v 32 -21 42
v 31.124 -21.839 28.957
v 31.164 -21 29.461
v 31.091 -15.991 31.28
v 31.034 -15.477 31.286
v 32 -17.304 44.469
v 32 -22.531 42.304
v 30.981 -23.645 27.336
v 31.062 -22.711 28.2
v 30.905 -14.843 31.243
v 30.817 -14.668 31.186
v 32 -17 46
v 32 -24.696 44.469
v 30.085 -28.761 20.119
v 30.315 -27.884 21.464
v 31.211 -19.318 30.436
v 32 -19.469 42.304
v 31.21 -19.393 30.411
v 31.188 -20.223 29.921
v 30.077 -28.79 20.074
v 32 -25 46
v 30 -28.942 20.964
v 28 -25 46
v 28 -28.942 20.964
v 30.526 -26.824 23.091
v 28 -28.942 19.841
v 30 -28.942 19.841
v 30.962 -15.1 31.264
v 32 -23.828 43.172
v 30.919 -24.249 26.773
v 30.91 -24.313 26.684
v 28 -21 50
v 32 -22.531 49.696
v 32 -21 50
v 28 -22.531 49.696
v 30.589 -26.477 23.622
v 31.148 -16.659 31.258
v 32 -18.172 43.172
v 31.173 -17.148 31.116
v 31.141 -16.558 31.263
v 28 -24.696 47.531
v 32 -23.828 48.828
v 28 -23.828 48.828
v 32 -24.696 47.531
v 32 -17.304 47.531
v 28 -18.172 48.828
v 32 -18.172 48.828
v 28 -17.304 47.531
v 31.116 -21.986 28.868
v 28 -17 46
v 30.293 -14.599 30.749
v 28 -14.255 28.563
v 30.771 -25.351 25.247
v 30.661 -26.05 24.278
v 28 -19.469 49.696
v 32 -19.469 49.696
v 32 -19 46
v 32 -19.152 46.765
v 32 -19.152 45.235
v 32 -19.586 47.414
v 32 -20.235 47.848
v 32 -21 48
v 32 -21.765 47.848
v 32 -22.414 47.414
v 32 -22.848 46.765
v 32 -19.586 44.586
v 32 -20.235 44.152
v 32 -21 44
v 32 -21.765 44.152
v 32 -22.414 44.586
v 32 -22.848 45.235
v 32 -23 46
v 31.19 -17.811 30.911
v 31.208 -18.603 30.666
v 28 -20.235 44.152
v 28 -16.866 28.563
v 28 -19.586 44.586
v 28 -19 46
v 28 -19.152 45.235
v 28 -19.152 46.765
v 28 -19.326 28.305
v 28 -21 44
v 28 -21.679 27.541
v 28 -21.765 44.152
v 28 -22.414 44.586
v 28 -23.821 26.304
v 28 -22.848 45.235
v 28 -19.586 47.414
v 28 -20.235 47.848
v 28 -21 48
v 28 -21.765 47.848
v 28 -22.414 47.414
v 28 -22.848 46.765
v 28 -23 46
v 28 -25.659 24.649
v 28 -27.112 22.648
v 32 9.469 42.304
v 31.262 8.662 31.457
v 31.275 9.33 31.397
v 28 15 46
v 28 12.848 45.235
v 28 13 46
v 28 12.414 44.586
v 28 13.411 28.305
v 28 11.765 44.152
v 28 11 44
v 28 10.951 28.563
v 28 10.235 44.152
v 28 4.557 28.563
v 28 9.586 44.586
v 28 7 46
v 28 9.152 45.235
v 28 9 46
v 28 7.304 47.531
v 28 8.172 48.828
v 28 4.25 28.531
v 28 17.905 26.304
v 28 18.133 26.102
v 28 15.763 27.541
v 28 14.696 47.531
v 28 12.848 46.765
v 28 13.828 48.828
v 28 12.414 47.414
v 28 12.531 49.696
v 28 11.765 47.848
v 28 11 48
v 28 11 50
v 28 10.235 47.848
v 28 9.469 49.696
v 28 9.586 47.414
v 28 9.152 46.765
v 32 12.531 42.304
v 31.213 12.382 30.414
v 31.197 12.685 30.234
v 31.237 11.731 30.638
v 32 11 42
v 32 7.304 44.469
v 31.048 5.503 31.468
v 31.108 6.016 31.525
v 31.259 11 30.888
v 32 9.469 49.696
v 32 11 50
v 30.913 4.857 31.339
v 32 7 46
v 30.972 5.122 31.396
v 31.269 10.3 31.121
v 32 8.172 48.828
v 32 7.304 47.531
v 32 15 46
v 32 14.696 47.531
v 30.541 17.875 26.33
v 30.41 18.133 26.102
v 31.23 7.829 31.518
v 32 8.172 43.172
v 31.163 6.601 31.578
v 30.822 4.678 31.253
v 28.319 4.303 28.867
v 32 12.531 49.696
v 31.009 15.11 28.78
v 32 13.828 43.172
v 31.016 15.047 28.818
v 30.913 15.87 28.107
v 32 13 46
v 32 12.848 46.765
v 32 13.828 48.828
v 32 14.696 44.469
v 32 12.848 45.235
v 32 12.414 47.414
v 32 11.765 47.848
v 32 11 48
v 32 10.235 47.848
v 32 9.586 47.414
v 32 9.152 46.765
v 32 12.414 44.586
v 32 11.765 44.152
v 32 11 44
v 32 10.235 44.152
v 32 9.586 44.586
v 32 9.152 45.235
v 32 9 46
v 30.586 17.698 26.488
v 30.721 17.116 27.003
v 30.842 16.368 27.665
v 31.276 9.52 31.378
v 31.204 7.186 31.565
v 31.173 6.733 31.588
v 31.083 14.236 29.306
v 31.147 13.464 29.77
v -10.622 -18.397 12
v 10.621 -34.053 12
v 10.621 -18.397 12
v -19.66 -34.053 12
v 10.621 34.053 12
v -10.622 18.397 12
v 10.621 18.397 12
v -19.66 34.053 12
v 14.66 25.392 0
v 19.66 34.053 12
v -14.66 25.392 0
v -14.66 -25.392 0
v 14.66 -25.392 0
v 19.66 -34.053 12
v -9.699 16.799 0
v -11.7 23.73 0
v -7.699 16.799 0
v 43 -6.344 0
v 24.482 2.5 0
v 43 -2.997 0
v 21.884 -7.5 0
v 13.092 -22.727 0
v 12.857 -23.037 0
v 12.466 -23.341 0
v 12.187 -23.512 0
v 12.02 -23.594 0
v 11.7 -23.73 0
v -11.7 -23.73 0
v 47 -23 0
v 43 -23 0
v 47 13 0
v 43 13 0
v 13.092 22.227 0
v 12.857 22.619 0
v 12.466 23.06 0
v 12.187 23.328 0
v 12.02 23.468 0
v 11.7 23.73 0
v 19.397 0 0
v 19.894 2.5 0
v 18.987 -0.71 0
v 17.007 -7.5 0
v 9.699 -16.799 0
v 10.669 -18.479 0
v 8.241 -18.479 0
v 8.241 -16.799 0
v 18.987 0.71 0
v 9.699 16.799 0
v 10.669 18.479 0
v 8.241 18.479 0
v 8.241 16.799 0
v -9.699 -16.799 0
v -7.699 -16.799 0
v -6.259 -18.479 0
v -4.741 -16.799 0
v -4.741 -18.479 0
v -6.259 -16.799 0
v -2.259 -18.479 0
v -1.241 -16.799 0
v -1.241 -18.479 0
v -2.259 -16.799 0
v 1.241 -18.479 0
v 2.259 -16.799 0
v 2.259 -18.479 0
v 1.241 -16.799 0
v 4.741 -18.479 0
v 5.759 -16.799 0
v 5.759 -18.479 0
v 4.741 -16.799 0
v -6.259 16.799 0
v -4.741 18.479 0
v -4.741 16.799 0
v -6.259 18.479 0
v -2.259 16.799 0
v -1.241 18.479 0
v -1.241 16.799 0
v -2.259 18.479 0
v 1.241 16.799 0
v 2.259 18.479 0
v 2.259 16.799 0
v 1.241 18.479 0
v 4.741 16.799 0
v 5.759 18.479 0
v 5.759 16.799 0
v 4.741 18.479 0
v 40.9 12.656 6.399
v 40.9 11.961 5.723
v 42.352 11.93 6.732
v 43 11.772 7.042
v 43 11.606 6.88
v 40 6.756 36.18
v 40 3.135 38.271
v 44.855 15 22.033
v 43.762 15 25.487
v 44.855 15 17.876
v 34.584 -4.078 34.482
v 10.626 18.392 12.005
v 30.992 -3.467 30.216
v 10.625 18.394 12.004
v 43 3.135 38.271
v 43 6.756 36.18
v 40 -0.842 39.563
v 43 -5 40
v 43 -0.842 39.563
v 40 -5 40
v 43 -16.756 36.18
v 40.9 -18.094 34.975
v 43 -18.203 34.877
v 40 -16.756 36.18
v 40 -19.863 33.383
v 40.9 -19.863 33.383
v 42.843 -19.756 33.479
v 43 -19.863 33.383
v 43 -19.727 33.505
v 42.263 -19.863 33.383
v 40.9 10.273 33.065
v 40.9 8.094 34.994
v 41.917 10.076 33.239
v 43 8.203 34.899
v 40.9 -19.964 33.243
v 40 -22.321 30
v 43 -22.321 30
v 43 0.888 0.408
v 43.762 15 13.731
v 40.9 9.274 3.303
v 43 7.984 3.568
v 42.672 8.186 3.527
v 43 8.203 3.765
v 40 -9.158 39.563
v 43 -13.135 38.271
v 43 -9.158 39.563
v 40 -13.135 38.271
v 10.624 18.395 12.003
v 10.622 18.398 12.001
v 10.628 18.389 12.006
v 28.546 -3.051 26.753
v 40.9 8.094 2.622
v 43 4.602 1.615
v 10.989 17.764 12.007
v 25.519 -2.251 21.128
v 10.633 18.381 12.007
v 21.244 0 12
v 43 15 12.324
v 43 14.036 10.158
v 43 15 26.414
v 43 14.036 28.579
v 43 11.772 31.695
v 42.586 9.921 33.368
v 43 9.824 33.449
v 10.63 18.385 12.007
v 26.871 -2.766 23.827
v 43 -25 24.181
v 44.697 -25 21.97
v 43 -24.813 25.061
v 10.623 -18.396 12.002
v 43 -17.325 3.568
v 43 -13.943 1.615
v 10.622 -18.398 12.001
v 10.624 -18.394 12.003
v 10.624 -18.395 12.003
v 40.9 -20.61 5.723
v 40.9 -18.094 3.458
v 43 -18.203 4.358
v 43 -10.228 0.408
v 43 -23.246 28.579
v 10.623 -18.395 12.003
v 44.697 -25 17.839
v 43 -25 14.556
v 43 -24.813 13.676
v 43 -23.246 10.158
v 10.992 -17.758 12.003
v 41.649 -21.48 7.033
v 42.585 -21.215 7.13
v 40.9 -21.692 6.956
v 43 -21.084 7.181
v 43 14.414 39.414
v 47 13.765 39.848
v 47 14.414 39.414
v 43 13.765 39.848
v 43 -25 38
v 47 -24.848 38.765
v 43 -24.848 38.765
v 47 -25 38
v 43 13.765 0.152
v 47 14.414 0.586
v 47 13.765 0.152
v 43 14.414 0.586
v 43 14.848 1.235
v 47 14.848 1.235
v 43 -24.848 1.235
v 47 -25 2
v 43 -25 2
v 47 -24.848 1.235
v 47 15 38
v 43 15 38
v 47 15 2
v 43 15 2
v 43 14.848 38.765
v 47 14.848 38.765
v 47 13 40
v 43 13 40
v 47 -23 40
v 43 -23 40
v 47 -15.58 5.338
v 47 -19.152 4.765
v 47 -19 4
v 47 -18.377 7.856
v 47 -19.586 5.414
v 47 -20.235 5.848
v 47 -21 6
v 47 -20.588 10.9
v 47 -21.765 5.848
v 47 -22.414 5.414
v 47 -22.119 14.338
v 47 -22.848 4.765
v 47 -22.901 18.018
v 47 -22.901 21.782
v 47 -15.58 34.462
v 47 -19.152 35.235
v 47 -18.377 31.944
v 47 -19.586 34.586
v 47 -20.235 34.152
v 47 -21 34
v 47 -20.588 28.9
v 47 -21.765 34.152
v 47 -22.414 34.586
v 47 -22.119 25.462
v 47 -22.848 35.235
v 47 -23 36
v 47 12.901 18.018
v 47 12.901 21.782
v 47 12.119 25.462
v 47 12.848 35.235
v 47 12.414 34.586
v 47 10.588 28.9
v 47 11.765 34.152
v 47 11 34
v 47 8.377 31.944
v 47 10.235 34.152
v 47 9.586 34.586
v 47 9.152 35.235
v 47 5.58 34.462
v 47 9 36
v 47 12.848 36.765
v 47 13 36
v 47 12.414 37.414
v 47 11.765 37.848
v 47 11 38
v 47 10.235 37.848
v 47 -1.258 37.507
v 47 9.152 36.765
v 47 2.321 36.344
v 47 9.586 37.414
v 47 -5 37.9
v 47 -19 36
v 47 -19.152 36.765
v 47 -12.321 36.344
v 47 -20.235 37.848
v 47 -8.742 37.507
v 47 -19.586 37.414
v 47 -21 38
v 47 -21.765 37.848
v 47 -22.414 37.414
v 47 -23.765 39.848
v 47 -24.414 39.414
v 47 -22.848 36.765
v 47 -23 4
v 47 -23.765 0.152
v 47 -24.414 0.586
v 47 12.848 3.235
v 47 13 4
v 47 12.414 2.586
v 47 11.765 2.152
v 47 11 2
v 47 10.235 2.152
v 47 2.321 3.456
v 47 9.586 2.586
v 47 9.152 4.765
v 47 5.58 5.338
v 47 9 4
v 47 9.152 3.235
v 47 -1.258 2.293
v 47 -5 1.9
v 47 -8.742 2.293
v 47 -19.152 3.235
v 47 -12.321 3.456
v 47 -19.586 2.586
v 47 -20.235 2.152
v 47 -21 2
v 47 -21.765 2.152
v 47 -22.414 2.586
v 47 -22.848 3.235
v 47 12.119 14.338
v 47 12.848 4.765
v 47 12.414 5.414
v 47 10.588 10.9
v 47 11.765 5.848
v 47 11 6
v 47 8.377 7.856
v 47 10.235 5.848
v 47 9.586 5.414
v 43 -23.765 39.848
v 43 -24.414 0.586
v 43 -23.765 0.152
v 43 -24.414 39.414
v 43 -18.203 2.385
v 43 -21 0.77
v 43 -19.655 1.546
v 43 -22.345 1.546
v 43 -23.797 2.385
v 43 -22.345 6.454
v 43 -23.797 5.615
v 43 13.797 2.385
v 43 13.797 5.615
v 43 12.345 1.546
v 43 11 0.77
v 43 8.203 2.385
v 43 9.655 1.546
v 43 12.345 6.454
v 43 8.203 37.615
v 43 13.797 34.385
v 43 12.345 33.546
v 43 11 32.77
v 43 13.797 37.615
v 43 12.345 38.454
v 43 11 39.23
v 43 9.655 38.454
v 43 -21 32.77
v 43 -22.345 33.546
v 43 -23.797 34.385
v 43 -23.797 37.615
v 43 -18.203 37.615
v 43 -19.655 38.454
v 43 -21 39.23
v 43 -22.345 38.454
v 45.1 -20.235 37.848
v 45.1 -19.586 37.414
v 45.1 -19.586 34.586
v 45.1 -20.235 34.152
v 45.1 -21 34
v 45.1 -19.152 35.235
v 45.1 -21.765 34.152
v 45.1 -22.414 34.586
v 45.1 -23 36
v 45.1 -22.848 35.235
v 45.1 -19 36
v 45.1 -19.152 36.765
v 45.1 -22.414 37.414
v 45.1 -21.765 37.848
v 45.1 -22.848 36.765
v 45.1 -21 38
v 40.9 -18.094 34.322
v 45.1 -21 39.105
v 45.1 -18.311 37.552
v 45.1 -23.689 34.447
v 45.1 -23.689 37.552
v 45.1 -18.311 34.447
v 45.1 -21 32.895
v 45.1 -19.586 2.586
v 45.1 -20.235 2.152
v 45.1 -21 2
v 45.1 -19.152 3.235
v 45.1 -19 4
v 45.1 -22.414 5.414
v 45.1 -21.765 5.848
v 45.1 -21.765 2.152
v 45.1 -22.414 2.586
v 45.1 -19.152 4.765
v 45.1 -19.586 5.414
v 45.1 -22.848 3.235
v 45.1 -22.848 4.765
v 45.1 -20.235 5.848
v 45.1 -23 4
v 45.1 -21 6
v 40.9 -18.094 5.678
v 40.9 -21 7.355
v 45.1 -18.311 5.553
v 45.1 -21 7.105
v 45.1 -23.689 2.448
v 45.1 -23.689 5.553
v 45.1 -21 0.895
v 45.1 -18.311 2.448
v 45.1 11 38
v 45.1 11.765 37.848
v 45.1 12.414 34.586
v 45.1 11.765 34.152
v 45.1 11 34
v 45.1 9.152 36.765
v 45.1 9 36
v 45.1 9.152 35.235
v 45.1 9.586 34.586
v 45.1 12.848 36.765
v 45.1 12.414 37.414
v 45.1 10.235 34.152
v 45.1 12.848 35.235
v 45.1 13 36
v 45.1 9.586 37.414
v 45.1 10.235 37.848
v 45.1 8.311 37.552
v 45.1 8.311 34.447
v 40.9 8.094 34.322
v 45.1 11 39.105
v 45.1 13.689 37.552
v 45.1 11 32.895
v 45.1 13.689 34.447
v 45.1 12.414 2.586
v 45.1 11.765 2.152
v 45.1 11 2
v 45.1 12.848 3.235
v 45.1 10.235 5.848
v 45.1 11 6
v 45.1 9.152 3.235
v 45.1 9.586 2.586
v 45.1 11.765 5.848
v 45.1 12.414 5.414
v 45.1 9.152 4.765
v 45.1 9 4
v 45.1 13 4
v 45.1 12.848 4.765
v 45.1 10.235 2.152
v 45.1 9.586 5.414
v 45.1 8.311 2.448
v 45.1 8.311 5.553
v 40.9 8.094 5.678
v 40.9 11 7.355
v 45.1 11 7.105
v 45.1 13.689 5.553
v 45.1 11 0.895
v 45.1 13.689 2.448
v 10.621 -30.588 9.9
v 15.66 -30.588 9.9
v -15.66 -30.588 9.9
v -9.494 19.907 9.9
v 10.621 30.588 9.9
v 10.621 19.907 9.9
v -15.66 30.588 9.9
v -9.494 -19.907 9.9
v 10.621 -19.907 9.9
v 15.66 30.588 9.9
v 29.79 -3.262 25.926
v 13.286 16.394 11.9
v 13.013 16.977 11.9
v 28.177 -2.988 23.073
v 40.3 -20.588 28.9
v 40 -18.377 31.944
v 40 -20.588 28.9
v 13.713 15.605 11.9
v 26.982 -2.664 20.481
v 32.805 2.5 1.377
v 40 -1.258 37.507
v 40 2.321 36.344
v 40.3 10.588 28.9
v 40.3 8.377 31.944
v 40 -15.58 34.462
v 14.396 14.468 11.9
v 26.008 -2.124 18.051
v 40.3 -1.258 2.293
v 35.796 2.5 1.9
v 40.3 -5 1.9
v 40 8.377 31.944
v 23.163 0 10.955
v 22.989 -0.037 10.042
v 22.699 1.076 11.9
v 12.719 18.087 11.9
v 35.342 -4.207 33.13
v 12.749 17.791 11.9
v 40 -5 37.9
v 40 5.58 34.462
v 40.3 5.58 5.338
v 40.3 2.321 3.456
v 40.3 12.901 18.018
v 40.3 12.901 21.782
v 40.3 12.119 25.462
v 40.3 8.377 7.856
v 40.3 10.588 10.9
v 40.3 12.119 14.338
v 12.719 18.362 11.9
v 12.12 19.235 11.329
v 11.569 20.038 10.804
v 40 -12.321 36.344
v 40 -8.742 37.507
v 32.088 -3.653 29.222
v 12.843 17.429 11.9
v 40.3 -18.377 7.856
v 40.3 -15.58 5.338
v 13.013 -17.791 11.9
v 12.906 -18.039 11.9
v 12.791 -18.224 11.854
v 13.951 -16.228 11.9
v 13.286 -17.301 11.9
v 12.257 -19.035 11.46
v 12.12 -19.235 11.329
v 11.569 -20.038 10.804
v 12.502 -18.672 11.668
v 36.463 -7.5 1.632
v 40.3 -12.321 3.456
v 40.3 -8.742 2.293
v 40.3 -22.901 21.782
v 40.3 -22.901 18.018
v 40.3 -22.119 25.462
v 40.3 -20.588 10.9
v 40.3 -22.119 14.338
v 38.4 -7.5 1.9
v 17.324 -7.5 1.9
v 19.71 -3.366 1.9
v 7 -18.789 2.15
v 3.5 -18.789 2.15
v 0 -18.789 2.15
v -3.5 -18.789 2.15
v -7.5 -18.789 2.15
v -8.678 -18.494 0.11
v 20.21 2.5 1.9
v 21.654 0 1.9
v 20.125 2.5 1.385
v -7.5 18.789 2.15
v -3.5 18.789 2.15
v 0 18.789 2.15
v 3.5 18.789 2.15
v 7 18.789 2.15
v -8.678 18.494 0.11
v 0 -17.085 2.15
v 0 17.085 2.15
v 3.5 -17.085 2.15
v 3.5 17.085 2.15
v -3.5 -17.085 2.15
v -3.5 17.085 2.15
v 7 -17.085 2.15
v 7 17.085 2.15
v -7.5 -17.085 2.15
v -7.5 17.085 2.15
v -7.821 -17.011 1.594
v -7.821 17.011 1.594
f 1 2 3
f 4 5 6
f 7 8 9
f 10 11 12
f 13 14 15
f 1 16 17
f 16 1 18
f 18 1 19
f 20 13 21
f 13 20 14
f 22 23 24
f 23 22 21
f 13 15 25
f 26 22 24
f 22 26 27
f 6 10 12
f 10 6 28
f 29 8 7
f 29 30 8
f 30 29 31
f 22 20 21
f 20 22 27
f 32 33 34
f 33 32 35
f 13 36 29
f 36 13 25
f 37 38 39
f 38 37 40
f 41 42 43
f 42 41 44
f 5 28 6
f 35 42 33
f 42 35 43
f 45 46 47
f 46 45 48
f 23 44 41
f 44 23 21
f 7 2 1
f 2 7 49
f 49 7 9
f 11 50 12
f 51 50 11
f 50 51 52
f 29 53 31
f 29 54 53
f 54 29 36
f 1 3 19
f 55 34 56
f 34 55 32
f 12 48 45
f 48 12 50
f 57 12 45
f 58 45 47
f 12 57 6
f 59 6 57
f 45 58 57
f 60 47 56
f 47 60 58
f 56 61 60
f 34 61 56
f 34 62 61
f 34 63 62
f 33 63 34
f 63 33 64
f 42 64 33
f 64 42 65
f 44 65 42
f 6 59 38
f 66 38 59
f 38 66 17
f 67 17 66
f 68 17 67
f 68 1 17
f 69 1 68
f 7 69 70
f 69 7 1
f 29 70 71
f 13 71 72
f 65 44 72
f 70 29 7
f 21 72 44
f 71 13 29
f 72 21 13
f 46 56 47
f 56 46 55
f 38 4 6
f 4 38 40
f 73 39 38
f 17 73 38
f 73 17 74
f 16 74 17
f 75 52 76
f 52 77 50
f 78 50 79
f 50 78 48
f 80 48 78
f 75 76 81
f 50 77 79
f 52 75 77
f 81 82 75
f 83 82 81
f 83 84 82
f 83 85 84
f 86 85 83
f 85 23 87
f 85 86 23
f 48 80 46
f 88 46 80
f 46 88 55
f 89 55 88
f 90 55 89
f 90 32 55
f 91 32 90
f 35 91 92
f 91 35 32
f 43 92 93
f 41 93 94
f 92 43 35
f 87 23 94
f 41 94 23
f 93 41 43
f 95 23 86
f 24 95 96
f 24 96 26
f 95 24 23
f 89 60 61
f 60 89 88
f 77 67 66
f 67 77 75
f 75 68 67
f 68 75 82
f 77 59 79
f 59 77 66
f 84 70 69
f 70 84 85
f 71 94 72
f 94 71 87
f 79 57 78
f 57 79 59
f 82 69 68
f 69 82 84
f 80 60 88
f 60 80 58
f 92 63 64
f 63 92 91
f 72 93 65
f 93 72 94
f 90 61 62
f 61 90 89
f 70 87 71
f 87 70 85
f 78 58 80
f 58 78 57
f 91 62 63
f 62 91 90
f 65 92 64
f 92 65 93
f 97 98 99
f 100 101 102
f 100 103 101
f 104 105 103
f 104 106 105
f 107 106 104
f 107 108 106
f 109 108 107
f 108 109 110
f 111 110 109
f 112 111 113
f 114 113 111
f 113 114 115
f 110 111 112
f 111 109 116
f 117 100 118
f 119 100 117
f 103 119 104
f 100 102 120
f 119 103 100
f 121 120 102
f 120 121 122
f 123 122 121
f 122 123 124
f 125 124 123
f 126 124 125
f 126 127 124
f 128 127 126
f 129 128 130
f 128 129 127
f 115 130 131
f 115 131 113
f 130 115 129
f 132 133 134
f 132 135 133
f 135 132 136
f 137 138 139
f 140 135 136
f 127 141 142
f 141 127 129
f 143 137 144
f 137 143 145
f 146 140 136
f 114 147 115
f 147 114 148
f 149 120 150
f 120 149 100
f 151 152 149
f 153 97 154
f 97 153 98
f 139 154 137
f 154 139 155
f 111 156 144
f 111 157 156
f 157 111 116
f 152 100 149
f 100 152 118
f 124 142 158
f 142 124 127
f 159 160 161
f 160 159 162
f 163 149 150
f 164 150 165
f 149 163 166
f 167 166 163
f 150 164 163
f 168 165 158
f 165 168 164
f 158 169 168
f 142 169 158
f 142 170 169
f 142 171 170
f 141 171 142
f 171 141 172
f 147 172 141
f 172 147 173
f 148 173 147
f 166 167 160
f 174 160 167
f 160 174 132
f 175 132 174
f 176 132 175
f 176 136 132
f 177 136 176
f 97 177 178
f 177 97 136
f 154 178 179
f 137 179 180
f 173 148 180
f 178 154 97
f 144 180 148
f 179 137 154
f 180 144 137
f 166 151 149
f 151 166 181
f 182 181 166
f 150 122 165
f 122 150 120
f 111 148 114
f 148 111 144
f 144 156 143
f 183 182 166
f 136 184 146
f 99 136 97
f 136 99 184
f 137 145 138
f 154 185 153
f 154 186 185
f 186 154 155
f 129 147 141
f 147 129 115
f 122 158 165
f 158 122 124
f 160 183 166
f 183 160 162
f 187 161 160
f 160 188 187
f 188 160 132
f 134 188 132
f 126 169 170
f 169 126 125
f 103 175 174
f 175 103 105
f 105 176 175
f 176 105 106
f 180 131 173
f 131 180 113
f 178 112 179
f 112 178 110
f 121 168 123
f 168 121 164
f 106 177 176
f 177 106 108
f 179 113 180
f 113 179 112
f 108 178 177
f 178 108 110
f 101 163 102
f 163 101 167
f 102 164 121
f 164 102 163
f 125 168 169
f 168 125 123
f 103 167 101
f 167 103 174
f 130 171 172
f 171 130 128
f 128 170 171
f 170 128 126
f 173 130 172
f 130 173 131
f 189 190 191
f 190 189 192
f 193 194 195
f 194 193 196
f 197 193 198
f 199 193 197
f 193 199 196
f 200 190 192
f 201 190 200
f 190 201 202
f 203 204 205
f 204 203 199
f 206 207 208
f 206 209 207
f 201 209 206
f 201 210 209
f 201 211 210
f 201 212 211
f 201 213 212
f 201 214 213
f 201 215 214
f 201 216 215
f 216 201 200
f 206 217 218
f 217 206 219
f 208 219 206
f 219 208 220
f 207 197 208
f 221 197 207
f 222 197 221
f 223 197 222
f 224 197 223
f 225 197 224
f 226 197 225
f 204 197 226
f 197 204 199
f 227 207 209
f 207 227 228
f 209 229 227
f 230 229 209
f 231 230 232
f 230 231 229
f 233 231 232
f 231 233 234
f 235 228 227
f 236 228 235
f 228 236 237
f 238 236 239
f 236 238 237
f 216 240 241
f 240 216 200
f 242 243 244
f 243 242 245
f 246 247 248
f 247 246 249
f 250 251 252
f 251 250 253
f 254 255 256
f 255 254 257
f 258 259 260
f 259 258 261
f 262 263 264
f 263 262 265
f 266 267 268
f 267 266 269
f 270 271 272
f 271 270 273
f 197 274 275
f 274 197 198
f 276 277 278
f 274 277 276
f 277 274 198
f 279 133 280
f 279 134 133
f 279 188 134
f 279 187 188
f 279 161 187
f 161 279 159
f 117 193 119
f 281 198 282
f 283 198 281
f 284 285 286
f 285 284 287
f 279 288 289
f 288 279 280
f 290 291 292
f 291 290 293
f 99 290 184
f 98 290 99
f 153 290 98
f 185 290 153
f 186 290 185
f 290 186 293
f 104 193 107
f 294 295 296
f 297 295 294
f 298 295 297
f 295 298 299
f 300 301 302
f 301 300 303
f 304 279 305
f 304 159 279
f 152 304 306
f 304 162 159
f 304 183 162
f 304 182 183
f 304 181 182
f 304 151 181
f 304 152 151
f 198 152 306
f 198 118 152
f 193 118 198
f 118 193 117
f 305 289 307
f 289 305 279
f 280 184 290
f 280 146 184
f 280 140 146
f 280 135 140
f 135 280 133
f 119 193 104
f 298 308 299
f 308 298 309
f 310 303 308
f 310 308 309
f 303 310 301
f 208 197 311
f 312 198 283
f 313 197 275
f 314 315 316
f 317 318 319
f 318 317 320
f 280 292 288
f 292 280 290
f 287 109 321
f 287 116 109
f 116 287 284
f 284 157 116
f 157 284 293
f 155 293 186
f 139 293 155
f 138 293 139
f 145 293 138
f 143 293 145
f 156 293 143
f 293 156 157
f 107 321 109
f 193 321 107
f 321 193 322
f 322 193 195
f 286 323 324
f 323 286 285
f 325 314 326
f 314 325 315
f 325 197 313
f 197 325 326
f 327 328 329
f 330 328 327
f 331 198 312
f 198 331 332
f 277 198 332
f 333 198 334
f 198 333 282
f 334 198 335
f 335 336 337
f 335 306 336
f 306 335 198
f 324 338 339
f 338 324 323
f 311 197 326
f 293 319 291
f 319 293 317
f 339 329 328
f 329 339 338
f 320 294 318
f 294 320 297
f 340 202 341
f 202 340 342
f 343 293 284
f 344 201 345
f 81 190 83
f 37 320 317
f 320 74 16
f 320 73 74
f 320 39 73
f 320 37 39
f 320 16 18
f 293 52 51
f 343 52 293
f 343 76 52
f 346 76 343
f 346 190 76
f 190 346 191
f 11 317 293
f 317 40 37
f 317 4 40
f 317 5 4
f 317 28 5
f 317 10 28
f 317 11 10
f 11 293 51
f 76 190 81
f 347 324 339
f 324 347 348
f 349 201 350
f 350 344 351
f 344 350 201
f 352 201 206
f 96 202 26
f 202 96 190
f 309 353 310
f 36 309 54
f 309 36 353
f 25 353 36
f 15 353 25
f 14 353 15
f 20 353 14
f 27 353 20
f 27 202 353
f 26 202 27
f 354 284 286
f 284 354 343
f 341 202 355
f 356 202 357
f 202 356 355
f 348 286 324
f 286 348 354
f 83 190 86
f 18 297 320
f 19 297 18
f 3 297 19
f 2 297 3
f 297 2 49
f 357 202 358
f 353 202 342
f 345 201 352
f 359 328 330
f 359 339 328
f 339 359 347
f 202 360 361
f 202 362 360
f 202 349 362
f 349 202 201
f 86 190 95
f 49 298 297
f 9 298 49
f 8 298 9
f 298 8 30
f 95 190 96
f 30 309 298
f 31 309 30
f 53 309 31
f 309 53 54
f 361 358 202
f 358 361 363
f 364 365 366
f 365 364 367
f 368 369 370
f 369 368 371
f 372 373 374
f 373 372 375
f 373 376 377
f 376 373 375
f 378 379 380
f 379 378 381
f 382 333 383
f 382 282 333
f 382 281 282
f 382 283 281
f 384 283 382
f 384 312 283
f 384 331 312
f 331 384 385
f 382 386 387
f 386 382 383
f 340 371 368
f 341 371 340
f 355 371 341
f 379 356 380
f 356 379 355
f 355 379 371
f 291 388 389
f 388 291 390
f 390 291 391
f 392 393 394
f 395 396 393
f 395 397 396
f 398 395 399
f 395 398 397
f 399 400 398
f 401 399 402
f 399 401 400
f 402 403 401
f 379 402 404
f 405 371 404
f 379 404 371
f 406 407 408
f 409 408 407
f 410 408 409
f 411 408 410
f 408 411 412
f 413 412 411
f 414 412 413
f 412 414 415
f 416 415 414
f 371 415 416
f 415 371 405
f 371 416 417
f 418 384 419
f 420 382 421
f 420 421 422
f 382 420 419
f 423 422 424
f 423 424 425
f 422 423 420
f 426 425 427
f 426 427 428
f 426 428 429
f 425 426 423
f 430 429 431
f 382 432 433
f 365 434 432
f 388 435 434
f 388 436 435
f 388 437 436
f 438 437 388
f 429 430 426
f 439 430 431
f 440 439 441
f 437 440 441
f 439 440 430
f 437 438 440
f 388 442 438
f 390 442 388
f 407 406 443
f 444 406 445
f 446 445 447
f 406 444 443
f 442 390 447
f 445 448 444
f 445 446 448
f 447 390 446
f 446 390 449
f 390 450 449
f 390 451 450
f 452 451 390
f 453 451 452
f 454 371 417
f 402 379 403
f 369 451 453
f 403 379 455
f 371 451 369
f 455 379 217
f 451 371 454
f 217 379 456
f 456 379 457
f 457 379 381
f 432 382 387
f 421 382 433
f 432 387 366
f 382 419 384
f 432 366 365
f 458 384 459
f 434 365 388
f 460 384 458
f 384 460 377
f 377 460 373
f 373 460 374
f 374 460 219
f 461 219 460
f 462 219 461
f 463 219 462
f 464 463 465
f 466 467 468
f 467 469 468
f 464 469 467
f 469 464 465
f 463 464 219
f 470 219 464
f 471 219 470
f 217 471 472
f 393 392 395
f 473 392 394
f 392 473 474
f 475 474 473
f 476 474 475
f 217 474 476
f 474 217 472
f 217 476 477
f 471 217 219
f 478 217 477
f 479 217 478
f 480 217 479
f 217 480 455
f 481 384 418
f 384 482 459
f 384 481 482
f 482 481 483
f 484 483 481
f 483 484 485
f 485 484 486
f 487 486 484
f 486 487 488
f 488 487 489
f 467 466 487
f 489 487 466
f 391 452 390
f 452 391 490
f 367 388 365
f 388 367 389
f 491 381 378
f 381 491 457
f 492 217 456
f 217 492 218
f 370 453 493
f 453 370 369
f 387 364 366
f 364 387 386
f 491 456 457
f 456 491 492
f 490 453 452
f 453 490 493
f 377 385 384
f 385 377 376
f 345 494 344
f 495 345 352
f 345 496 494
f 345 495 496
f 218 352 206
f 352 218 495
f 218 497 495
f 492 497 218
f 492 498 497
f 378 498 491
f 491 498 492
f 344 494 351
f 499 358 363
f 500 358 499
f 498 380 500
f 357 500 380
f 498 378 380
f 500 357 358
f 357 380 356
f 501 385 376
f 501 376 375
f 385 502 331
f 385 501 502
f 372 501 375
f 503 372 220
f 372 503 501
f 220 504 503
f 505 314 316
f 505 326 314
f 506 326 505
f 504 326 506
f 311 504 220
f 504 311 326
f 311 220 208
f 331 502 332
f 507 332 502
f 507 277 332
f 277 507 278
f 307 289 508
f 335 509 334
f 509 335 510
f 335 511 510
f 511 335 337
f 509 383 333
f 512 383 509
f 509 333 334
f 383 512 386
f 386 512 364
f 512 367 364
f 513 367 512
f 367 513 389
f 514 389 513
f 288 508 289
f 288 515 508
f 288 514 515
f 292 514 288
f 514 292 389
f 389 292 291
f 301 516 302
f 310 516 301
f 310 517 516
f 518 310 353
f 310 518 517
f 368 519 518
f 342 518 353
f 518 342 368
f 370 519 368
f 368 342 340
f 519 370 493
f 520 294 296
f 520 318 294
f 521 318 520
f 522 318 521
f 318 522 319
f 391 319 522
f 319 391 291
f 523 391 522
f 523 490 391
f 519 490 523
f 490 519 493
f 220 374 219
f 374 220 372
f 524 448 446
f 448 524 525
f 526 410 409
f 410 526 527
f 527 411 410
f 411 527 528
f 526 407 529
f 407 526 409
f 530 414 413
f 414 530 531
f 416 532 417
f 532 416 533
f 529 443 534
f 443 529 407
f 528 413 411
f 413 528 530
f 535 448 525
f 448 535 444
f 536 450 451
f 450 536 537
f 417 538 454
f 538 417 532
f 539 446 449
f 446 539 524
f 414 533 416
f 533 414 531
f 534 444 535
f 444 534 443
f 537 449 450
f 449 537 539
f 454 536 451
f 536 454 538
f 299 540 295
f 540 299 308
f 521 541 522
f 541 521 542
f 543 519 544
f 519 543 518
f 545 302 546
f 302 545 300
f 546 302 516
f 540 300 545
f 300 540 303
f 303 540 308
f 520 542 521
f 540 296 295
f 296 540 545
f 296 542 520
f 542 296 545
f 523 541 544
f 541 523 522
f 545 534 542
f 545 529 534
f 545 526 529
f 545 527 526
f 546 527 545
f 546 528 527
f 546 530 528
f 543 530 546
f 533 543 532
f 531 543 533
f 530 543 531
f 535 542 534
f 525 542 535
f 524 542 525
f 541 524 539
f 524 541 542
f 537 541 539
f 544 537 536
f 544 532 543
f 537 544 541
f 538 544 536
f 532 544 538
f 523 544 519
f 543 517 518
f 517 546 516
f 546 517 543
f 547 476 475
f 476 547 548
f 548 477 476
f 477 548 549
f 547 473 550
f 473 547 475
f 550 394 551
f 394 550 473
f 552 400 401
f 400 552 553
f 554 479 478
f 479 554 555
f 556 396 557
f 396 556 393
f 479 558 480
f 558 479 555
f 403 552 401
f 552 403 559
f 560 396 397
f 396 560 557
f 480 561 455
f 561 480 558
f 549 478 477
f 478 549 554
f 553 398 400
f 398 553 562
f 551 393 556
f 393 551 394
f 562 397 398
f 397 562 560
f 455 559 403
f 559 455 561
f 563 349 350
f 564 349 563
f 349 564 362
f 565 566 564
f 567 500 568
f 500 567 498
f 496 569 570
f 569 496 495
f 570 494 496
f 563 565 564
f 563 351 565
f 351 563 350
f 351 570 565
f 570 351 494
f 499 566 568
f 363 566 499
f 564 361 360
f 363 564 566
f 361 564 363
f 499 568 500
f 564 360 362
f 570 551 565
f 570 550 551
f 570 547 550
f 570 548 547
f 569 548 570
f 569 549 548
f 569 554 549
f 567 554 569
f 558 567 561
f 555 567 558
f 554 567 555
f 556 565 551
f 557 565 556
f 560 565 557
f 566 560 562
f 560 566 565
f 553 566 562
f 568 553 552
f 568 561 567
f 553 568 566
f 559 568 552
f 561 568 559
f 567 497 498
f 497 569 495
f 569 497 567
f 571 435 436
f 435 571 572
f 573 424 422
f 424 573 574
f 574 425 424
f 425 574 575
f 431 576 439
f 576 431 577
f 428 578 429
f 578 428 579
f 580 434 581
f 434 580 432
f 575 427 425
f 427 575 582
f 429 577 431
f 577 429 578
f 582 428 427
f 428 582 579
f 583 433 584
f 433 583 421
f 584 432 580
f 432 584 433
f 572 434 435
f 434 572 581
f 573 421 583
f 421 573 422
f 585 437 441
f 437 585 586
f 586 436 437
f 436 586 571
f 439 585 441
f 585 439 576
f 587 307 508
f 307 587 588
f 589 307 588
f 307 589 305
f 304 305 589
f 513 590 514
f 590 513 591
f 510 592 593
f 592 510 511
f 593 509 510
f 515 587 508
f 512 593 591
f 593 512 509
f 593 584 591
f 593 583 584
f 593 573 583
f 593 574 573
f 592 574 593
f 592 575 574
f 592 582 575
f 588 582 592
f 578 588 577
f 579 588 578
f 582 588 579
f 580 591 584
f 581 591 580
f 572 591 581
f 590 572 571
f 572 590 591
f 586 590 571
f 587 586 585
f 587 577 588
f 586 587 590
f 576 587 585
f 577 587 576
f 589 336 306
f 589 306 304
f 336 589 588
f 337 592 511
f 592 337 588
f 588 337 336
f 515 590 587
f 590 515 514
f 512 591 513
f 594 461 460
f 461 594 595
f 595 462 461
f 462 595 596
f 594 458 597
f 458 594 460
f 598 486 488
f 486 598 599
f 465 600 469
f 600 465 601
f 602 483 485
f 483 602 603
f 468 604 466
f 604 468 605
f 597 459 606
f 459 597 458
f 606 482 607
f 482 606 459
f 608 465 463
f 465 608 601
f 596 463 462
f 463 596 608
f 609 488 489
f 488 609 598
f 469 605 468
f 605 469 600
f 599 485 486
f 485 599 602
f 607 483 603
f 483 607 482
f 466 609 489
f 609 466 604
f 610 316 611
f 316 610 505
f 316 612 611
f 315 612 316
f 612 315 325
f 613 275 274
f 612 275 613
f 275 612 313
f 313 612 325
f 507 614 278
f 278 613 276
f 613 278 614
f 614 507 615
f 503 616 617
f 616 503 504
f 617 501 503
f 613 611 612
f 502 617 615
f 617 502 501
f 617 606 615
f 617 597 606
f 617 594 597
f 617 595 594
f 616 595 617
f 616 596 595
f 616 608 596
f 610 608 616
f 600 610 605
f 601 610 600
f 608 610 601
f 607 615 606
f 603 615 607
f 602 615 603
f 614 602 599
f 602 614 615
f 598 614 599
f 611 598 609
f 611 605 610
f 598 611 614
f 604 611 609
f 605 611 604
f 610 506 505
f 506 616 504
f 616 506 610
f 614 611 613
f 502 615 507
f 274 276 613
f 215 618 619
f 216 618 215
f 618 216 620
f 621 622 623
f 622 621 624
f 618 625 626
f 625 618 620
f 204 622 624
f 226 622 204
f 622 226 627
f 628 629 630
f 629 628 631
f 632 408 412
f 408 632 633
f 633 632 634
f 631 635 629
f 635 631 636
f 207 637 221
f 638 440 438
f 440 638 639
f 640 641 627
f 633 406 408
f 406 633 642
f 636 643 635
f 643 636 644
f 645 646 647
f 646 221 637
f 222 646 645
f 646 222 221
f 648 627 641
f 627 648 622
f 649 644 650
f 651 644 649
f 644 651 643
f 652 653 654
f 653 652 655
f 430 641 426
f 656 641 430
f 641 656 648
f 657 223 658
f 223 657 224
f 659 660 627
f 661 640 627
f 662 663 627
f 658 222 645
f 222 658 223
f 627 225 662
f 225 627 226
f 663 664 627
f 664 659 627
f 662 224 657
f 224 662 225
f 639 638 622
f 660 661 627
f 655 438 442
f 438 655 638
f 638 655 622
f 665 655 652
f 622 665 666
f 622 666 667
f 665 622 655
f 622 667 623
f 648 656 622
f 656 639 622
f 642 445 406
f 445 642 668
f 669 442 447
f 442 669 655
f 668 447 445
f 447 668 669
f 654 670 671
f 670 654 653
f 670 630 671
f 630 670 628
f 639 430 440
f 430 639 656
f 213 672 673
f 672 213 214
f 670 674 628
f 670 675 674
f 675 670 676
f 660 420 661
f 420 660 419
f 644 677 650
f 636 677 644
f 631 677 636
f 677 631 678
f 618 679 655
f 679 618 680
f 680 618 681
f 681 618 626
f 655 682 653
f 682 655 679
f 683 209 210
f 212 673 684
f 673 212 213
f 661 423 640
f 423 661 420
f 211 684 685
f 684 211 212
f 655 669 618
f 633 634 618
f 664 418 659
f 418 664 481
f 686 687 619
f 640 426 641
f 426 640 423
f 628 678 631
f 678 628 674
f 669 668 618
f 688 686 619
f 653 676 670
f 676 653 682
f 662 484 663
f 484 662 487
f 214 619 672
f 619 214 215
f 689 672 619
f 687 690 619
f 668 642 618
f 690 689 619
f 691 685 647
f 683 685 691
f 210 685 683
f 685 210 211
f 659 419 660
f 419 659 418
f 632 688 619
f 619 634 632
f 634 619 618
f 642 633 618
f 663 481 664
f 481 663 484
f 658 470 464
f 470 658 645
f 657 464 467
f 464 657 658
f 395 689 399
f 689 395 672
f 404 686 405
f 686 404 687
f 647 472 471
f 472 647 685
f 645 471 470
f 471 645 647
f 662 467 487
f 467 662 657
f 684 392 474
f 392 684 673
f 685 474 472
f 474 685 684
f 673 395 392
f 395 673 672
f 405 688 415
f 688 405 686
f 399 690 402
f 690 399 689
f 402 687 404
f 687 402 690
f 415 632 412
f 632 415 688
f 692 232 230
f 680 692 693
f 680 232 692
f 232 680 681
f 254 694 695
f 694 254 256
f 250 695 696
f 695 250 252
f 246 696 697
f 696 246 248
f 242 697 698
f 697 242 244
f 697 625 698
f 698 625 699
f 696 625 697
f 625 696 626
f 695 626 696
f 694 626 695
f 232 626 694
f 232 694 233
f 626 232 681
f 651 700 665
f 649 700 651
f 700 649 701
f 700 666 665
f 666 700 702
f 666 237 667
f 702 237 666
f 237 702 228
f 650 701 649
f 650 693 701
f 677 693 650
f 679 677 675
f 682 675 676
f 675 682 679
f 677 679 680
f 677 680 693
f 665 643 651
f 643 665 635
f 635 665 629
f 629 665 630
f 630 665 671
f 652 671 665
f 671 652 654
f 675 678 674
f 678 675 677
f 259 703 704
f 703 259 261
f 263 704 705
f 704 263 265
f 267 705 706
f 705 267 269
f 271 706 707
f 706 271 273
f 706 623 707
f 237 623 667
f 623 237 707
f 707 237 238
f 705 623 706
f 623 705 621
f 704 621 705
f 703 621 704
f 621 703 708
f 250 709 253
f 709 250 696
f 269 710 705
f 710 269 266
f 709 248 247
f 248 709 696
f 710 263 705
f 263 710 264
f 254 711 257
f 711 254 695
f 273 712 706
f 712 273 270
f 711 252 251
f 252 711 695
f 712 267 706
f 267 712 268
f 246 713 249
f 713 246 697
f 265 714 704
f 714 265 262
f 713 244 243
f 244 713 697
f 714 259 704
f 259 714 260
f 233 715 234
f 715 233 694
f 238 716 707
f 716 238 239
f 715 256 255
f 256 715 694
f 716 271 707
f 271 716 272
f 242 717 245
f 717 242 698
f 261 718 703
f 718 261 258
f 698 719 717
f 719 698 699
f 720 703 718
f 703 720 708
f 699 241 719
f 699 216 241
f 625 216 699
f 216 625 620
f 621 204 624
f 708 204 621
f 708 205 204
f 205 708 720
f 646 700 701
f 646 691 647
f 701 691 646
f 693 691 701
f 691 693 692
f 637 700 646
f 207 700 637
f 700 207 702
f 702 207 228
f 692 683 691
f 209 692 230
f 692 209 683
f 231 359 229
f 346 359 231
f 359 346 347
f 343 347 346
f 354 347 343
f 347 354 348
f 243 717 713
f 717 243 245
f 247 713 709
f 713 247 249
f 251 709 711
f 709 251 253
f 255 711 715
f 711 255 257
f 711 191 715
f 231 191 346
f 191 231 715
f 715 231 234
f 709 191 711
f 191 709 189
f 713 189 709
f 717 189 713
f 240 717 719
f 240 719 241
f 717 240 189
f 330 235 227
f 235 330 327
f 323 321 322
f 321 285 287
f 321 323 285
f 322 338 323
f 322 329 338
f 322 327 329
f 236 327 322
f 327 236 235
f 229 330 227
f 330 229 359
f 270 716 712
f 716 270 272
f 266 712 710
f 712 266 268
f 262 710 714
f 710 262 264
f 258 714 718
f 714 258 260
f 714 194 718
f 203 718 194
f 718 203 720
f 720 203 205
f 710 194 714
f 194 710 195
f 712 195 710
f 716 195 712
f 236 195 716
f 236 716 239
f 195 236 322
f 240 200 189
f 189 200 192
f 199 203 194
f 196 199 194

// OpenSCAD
hot_rad = 30/2/cos(30);
hotend_x=25;
fan_x = 15+5;

hotend_y=-5;

thickness = 10;
wall=2;
slop=.2;

fan_hole = (40-wall-wall)/2;
mount_drop = 10;
fan_z = fan_hole+wall;

fan_mount();
//bowden_fan();
//cyclops_fan();

%cylinder(r=hot_rad, h=20, center=true);
%translate([-23,0,0]) cylinder(r=hot_rad, h=20, center=true);

m3_cap_rad = 4;
m3_rad = 2;
m3_nut_rad = 6.01/2+.1;

facets = 6;

duct_angle=-5;
duct_jut = -5;

module fan_mount(){
    difference(){
        union(){
            //core
            cylinder(r1=hot_rad+thickness+wall, r2=hot_rad+thickness*2+wall, h=thickness+wall, $fn=facets);
            
            hull(){
                intersection(){
                    difference(){
                        cylinder(r1=hot_rad+thickness+wall, r2=hot_rad+thickness*2+wall, h=thickness+wall, $fn=facets);
                        translate([0,0,-.5]) cylinder(r1=hot_rad+wall, r2=hot_rad+wall+wall, h=thickness+wall+1, $fn=facets);
                    }
                    translate([50+hot_rad-6.7,50,50]) cube([100,100,100], center=true);
                }
                translate([hotend_x+fan_x-5,hotend_y,fan_z]) rotate([0,90,0]) cylinder(r=fan_hole+wall, h=5);
            }
            
            hull(){
                intersection(){
                    difference(){
                        cylinder(r1=hot_rad+thickness+wall, r2=hot_rad+thickness*2+wall, h=thickness+wall, $fn=facets);
                        translate([0,0,-.5]) cylinder(r1=hot_rad+wall, r2=hot_rad+wall+wall, h=thickness+wall+1, $fn=facets);
                    }
                    translate([50+hot_rad-6.7,-50,50]) cube([100,100,100], center=true);
                }
                translate([hotend_x+fan_x-5,hotend_y,fan_z]) rotate([0,90,0]) cylinder(r=fan_hole+wall, h=5);
            }
            
            //fan mount
            translate([hotend_x+fan_x,hotend_y,fan_z]) rotate([0,90,0]){
                hull() for(i=[0:90:359]) rotate([0,0,i]) {
                    #translate([20-wall,20-wall,-wall]) cylinder(r=wall,h=wall*2, $fn=16);
                }    
            }
            
            //mounting lugs above fan
            translate([hotend_x+fan_x,hotend_y,fan_z]) rotate([0,90,0]){
                for(i=[-16, 16]) difference(){
                    hull(){
                        translate([-16-mount_drop,i,-fan_x+3]) cylinder(r=m3_rad+wall, h=wall*2, $fn=16);
                        translate([0,i,-fan_x+3]) cylinder(r=m3_cap_rad*2, h=wall);
                    }
                    translate([-16-mount_drop,i,-fan_x+3-.1]) cylinder(r=m3_rad, h=wall*2+1, $fn=16);
                }
            }
        }
        
        //center cutout
        translate([0,0,-.5]) cylinder(r1=hot_rad+wall, r2=hot_rad+wall+wall, h=thickness+wall+1, $fn=facets);
                
        //front cutout
        translate([-(hot_rad+thickness*2+wall),0,0]) cylinder(r=hot_rad+thickness*2+wall, h=thickness+wall*10, center=true, $fn=facets);
        
        //fan holes
        translate([hotend_x+fan_x,hotend_y,fan_z]) rotate([0,90,0]){
            for(i=[-16, 16]) for(j=[-16, 16]) {
                #translate([j,i,-.1]) cylinder(r=m3_rad, h=wall+.2, $fn=16);
                translate([j,i,-wall*2-.1]) cylinder(r2=m3_nut_rad, r1=m3_nut_rad+.25, h=wall*2+.2, $fn=6);
            }
        }
        
        //air path
        translate([0,0,-.1]) difference(){
            union(){
                translate([-wall,0,0]) cylinder(r1=hot_rad+thickness, r2=hot_rad+thickness*2-wall, h=thickness, $fn=facets);
                hull(){
                    intersection(){
                        difference(){
                            translate([-wall,0,0]) cylinder(r1=hot_rad+thickness, r2=hot_rad+thickness*2-wall, h=thickness, $fn=facets);
                            translate([0,0,-.5]) cylinder(r1=hot_rad+wall*2, r2=hot_rad+wall*3, h=thickness+wall+1, $fn=facets);
                        }
                        translate([50+hot_rad-6.7,50,50]) cube([100,100,100], center=true);
                    }
                    translate([hotend_x+fan_x-5,hotend_y,fan_z]) rotate([0,90,0]) cylinder(r=fan_hole, h=.3);
                }
                
                hull(){
                    intersection(){
                        difference(){
                            translate([-wall,0,0]) cylinder(r1=hot_rad+thickness, r2=hot_rad+thickness*2-wall, h=thickness, $fn=facets);
                            translate([0,0,-.5]) cylinder(r1=hot_rad+wall+wall, r2=hot_rad+wall+wall+wall, h=thickness+wall+1, $fn=facets);
                        }
                        translate([50+hot_rad-6.7,-50,50]) cube([100,100,100], center=true);
                    }
                    translate([hotend_x+fan_x-5,hotend_y,fan_z]) rotate([0,90,0]) cylinder(r=fan_hole, h=.3);
                }
                
                translate([hotend_x+fan_x-5,hotend_y,fan_z]) rotate([0,90,0]) cylinder(r=fan_hole, h=wall+1+5);
            }
            difference () {
                cylinder(r1=hot_rad+wall+wall, r2=hot_rad+wall+wall+wall, h=thickness+wall, $fn=facets);
                #translate([0,(hot_rad*2+wall+wall)/2,.75]) rotate([0,-90,90]) cylinder(r=1.5, h=hot_rad*2+wall+wall, $fn=3);
                #translate([3.5,(hot_rad*2+wall+wall)/2,.75]) rotate([0,-90,90]) cylinder(r=1.5, h=hot_rad*2+wall+wall, $fn=3);
                #translate([-3.5,(hot_rad*2+wall+wall)/2,.75]) rotate([0,-90,90]) cylinder(r=1.5, h=hot_rad*2+wall+wall, $fn=3);
                #translate([7,(hot_rad*2+wall+wall)/2,.75]) rotate([0,-90,90]) cylinder(r=1.5, h=hot_rad*2+wall+wall, $fn=3);
                #translate([-7.5,(hot_rad*2+wall+wall)/2,.75]) rotate([0,-90,90]) cylinder(r=1.5, h=hot_rad*2+wall+wall, $fn=3);
            }
            translate([-(hot_rad+thickness*2),0,0]) cylinder(r=hot_rad+thickness*2+wall, h=thickness+wall*10, center=true, $fn=facets);
            translate([0,-5+hotend_y/2,0])cube([100,10,wall]);
        }
    }
}

module bowden_fan(){
    duct_w = 15+slop;
    duct_h = 20+slop;
    duct_offset=38;
    
    mount_height = 46;
    
    offset = -20;
    difference(){
        union(){
            //core
            hull(){
                cylinder(r1=hot_rad+thickness+wall, r2=hot_rad+thickness*2+wall, h=thickness+wall, $fn=facets);
                translate([offset,0,0]) cylinder(r1=hot_rad+thickness+wall, r2=hot_rad+thickness*2+wall, h=thickness+wall, $fn=facets);
            }
            
            //connection to duct
            hull(){
                intersection(){
                    cylinder(r1=hot_rad+thickness+wall, r2=hot_rad+thickness*2+wall, h=thickness+wall, $fn=facets);
                    translate([hot_rad+wall*2,0,0]) cube([1,200,200], center=true);
                }
                translate([duct_offset,duct_jut,duct_h/2+wall]) rotate([0,0,duct_angle]) cube([1,duct_w+wall*2, duct_h+wall*2], center=true);
            }
            
            //the duct connector
            translate([duct_offset,duct_jut,0]) rotate([0,0,duct_angle]) duct();
            
            //mounting lugs
           for(i=[10,-20,-40]) difference(){
                translate([i,hot_rad+wall*2,0]) hull(){
                    translate([5,0,thickness]) rotate([90,0,0]) cylinder(r=m3_cap_rad+wall*2, h=wall, center=true);
                    translate([0,0,mount_height]) rotate([90,0,0]) cylinder(r=m3_cap_rad+wall, h=wall, center=true);
                }
                
                //mounting holes up top
                translate([i,hot_rad+wall*2,mount_height]) rotate([90,0,0]) cylinder(r=m3_rad+slop, h=20, center=true);
            }
        }
        
        //connection to duct airflow
        hull(){
            intersection(){
                translate([0,0,wall]) cylinder(r1=hot_rad+thickness, r2=hot_rad+thickness*2, h=thickness-wall, $fn=facets);
                translate([hot_rad+wall*3,0,0]) cube([1,200,200], center=true);
            }
            translate([duct_offset,duct_jut,duct_h/2+wall]) rotate([0,0,duct_angle]) cube([1.2,duct_w, duct_h], center=true);
        }
        
        //center cutout
        translate([0,0,-.5]) hull(){
            cylinder(r1=hot_rad+wall, r2=hot_rad+wall*3, h=thickness+wall+1, $fn=facets);
            translate([2*offset,0,0]) cylinder(r1=hot_rad+wall, r2=hot_rad+wall*3, h=thickness+wall+1, $fn=facets);
        }
        
        //air path
        difference(){
            //core
            translate([0,0,-.1]) hull(){
                cylinder(r1=hot_rad+thickness, r2=hot_rad+thickness*2-wall, h=thickness, $fn=facets);
                translate([offset+wall,0,0]) cylinder(r1=hot_rad+thickness, r2=hot_rad+thickness*2-wall, h=thickness, $fn=facets);
            }
            
            //keep the center walls in place
            translate([0,0,-.5]) hull(){
                cylinder(r1=hot_rad+wall*2, r2=hot_rad+wall*4, h=thickness+wall+1, $fn=facets);
                translate([2*offset,0,0]) cylinder(r1=hot_rad+wall*2, r2=hot_rad+wall*4, h=thickness+wall+1, $fn=facets);
            }
            
            //bottom on the near side
            translate([10,0,-.5]) cylinder(r1=hot_rad+wall*2, r2=hot_rad+wall*2.5, h=wall+.5, $fn=facets);
        }
    }
}

module cyclops_fan(){
    duct_w = 15+slop;
    duct_h = 20+slop;
    duct_offset=38;
    
    mount_height = 46-1.5;
    mount_offset = 10;
    
    offset = -11;
    difference(){
        union(){
            //core
            hull(){
                cylinder(r1=hot_rad+thickness+wall, r2=hot_rad+thickness*2+wall, h=thickness+wall, $fn=facets);
                translate([offset,0,0]) cylinder(r1=hot_rad+thickness+wall, r2=hot_rad+thickness*2+wall, h=thickness+wall, $fn=facets);
            }
            
            //connection to duct
            hull(){
                intersection(){
                    cylinder(r1=hot_rad+thickness+wall, r2=hot_rad+thickness*2+wall, h=thickness+wall, $fn=facets);
                    translate([hot_rad+wall*2,0,0]) cube([1,200,200], center=true);
                }
                translate([duct_offset,duct_jut,duct_h/2+wall]) rotate([0,0,duct_angle]) cube([1,duct_w+wall*2, duct_h+wall*2], center=true);
            }
            
            //the duct connector
            translate([duct_offset,duct_jut,0]) rotate([0,0,duct_angle]) duct();
            
            //mounting lugs
           for(i=[10-mount_offset,-20-mount_offset]) difference(){
                translate([i,hot_rad+wall*2,0]) hull(){
                    translate([5,0,thickness]) rotate([90,0,0]) cylinder(r=m3_cap_rad+wall*2, h=wall, center=true);
                    translate([0,0,mount_height]) rotate([90,0,0]) cylinder(r=m3_cap_rad+wall, h=wall, center=true);
                }
                
                //mounting holes up top
                translate([i,hot_rad+wall*2,mount_height]) rotate([90,0,0]) cylinder(r=m3_rad+slop, h=20, center=true);
            }
        }
        
        //connection to duct airflow
        hull(){
            intersection(){
                translate([0,0,wall]) cylinder(r1=hot_rad+thickness, r2=hot_rad+thickness*2, h=thickness-wall, $fn=facets);
                translate([hot_rad+wall*3,0,0]) cube([1,200,200], center=true);
            }
            translate([duct_offset,duct_jut,duct_h/2+wall]) rotate([0,0,duct_angle]) cube([1.2,duct_w, duct_h], center=true);
        }
        
        //center cutout
        translate([0,0,-.5]) hull(){
            cylinder(r1=hot_rad+wall, r2=hot_rad+wall*3, h=thickness+wall+1, $fn=facets);
            translate([5*offset,0,0]) cylinder(r1=hot_rad+wall, r2=hot_rad+wall*3, h=thickness+wall+1, $fn=facets);
        }
        
        //air path
        difference(){
            //core
            translate([0,0,-.1]) hull(){
                cylinder(r1=hot_rad+thickness, r2=hot_rad+thickness*2-wall, h=thickness, $fn=facets);
                translate([offset+wall,0,0]) cylinder(r1=hot_rad+thickness, r2=hot_rad+thickness*2-wall, h=thickness, $fn=facets);
            }
            
            //keep the center walls in place
            translate([0,0,-.5]) hull(){
                cylinder(r1=hot_rad+wall*2, r2=hot_rad+wall*4, h=thickness+wall+1, $fn=facets);
                translate([5*offset,0,0]) cylinder(r1=hot_rad+wall*2, r2=hot_rad+wall*4, h=thickness+wall+1, $fn=facets);
            }
            
            //bottom on the near side
            translate([10,0,-.5]) cylinder(r1=hot_rad+wall*2, r2=hot_rad+wall*2.5, h=wall+.5, $fn=facets);
        }
    }
}

module duct(){
    duct_w = 15+slop;
    duct_h = 20+slop;
    rad = 20;
    
    translate([0,0,rad+wall+duct_h/2]) rotate([-90,0,0]) union(){
        intersection(){
            rotate_extrude(angle = 90, convexity = 2){
                translate([rad,0,0])
                difference(){
                    square([duct_h+wall*2, duct_w+wall*2], center=true);
                    square([duct_h, duct_w], center=true);
                }
            }
            translate([0,0,-100]) cube([200,200,200]);
        }
        
        translate([rad,0,0]) rotate([90,0,0]) translate([0,0,8]) difference(){
            hull(){
                translate([0,0,-8]) cube([duct_h+wall*2,duct_w+wall*2,.1], center=true);
                #translate([duct_h/2+wall/2,0,8]) cube([wall,duct_w+wall*2,.1], center=true);
            }
            
            //hollow center
            cube([duct_h,duct_w,16.3], center=true);
            
            //slot for the clip
            translate([wall+1,0,(12-16)/2]) cube([duct_h+wall*2,2,12], center=true);
        }
        
    }
    
}
